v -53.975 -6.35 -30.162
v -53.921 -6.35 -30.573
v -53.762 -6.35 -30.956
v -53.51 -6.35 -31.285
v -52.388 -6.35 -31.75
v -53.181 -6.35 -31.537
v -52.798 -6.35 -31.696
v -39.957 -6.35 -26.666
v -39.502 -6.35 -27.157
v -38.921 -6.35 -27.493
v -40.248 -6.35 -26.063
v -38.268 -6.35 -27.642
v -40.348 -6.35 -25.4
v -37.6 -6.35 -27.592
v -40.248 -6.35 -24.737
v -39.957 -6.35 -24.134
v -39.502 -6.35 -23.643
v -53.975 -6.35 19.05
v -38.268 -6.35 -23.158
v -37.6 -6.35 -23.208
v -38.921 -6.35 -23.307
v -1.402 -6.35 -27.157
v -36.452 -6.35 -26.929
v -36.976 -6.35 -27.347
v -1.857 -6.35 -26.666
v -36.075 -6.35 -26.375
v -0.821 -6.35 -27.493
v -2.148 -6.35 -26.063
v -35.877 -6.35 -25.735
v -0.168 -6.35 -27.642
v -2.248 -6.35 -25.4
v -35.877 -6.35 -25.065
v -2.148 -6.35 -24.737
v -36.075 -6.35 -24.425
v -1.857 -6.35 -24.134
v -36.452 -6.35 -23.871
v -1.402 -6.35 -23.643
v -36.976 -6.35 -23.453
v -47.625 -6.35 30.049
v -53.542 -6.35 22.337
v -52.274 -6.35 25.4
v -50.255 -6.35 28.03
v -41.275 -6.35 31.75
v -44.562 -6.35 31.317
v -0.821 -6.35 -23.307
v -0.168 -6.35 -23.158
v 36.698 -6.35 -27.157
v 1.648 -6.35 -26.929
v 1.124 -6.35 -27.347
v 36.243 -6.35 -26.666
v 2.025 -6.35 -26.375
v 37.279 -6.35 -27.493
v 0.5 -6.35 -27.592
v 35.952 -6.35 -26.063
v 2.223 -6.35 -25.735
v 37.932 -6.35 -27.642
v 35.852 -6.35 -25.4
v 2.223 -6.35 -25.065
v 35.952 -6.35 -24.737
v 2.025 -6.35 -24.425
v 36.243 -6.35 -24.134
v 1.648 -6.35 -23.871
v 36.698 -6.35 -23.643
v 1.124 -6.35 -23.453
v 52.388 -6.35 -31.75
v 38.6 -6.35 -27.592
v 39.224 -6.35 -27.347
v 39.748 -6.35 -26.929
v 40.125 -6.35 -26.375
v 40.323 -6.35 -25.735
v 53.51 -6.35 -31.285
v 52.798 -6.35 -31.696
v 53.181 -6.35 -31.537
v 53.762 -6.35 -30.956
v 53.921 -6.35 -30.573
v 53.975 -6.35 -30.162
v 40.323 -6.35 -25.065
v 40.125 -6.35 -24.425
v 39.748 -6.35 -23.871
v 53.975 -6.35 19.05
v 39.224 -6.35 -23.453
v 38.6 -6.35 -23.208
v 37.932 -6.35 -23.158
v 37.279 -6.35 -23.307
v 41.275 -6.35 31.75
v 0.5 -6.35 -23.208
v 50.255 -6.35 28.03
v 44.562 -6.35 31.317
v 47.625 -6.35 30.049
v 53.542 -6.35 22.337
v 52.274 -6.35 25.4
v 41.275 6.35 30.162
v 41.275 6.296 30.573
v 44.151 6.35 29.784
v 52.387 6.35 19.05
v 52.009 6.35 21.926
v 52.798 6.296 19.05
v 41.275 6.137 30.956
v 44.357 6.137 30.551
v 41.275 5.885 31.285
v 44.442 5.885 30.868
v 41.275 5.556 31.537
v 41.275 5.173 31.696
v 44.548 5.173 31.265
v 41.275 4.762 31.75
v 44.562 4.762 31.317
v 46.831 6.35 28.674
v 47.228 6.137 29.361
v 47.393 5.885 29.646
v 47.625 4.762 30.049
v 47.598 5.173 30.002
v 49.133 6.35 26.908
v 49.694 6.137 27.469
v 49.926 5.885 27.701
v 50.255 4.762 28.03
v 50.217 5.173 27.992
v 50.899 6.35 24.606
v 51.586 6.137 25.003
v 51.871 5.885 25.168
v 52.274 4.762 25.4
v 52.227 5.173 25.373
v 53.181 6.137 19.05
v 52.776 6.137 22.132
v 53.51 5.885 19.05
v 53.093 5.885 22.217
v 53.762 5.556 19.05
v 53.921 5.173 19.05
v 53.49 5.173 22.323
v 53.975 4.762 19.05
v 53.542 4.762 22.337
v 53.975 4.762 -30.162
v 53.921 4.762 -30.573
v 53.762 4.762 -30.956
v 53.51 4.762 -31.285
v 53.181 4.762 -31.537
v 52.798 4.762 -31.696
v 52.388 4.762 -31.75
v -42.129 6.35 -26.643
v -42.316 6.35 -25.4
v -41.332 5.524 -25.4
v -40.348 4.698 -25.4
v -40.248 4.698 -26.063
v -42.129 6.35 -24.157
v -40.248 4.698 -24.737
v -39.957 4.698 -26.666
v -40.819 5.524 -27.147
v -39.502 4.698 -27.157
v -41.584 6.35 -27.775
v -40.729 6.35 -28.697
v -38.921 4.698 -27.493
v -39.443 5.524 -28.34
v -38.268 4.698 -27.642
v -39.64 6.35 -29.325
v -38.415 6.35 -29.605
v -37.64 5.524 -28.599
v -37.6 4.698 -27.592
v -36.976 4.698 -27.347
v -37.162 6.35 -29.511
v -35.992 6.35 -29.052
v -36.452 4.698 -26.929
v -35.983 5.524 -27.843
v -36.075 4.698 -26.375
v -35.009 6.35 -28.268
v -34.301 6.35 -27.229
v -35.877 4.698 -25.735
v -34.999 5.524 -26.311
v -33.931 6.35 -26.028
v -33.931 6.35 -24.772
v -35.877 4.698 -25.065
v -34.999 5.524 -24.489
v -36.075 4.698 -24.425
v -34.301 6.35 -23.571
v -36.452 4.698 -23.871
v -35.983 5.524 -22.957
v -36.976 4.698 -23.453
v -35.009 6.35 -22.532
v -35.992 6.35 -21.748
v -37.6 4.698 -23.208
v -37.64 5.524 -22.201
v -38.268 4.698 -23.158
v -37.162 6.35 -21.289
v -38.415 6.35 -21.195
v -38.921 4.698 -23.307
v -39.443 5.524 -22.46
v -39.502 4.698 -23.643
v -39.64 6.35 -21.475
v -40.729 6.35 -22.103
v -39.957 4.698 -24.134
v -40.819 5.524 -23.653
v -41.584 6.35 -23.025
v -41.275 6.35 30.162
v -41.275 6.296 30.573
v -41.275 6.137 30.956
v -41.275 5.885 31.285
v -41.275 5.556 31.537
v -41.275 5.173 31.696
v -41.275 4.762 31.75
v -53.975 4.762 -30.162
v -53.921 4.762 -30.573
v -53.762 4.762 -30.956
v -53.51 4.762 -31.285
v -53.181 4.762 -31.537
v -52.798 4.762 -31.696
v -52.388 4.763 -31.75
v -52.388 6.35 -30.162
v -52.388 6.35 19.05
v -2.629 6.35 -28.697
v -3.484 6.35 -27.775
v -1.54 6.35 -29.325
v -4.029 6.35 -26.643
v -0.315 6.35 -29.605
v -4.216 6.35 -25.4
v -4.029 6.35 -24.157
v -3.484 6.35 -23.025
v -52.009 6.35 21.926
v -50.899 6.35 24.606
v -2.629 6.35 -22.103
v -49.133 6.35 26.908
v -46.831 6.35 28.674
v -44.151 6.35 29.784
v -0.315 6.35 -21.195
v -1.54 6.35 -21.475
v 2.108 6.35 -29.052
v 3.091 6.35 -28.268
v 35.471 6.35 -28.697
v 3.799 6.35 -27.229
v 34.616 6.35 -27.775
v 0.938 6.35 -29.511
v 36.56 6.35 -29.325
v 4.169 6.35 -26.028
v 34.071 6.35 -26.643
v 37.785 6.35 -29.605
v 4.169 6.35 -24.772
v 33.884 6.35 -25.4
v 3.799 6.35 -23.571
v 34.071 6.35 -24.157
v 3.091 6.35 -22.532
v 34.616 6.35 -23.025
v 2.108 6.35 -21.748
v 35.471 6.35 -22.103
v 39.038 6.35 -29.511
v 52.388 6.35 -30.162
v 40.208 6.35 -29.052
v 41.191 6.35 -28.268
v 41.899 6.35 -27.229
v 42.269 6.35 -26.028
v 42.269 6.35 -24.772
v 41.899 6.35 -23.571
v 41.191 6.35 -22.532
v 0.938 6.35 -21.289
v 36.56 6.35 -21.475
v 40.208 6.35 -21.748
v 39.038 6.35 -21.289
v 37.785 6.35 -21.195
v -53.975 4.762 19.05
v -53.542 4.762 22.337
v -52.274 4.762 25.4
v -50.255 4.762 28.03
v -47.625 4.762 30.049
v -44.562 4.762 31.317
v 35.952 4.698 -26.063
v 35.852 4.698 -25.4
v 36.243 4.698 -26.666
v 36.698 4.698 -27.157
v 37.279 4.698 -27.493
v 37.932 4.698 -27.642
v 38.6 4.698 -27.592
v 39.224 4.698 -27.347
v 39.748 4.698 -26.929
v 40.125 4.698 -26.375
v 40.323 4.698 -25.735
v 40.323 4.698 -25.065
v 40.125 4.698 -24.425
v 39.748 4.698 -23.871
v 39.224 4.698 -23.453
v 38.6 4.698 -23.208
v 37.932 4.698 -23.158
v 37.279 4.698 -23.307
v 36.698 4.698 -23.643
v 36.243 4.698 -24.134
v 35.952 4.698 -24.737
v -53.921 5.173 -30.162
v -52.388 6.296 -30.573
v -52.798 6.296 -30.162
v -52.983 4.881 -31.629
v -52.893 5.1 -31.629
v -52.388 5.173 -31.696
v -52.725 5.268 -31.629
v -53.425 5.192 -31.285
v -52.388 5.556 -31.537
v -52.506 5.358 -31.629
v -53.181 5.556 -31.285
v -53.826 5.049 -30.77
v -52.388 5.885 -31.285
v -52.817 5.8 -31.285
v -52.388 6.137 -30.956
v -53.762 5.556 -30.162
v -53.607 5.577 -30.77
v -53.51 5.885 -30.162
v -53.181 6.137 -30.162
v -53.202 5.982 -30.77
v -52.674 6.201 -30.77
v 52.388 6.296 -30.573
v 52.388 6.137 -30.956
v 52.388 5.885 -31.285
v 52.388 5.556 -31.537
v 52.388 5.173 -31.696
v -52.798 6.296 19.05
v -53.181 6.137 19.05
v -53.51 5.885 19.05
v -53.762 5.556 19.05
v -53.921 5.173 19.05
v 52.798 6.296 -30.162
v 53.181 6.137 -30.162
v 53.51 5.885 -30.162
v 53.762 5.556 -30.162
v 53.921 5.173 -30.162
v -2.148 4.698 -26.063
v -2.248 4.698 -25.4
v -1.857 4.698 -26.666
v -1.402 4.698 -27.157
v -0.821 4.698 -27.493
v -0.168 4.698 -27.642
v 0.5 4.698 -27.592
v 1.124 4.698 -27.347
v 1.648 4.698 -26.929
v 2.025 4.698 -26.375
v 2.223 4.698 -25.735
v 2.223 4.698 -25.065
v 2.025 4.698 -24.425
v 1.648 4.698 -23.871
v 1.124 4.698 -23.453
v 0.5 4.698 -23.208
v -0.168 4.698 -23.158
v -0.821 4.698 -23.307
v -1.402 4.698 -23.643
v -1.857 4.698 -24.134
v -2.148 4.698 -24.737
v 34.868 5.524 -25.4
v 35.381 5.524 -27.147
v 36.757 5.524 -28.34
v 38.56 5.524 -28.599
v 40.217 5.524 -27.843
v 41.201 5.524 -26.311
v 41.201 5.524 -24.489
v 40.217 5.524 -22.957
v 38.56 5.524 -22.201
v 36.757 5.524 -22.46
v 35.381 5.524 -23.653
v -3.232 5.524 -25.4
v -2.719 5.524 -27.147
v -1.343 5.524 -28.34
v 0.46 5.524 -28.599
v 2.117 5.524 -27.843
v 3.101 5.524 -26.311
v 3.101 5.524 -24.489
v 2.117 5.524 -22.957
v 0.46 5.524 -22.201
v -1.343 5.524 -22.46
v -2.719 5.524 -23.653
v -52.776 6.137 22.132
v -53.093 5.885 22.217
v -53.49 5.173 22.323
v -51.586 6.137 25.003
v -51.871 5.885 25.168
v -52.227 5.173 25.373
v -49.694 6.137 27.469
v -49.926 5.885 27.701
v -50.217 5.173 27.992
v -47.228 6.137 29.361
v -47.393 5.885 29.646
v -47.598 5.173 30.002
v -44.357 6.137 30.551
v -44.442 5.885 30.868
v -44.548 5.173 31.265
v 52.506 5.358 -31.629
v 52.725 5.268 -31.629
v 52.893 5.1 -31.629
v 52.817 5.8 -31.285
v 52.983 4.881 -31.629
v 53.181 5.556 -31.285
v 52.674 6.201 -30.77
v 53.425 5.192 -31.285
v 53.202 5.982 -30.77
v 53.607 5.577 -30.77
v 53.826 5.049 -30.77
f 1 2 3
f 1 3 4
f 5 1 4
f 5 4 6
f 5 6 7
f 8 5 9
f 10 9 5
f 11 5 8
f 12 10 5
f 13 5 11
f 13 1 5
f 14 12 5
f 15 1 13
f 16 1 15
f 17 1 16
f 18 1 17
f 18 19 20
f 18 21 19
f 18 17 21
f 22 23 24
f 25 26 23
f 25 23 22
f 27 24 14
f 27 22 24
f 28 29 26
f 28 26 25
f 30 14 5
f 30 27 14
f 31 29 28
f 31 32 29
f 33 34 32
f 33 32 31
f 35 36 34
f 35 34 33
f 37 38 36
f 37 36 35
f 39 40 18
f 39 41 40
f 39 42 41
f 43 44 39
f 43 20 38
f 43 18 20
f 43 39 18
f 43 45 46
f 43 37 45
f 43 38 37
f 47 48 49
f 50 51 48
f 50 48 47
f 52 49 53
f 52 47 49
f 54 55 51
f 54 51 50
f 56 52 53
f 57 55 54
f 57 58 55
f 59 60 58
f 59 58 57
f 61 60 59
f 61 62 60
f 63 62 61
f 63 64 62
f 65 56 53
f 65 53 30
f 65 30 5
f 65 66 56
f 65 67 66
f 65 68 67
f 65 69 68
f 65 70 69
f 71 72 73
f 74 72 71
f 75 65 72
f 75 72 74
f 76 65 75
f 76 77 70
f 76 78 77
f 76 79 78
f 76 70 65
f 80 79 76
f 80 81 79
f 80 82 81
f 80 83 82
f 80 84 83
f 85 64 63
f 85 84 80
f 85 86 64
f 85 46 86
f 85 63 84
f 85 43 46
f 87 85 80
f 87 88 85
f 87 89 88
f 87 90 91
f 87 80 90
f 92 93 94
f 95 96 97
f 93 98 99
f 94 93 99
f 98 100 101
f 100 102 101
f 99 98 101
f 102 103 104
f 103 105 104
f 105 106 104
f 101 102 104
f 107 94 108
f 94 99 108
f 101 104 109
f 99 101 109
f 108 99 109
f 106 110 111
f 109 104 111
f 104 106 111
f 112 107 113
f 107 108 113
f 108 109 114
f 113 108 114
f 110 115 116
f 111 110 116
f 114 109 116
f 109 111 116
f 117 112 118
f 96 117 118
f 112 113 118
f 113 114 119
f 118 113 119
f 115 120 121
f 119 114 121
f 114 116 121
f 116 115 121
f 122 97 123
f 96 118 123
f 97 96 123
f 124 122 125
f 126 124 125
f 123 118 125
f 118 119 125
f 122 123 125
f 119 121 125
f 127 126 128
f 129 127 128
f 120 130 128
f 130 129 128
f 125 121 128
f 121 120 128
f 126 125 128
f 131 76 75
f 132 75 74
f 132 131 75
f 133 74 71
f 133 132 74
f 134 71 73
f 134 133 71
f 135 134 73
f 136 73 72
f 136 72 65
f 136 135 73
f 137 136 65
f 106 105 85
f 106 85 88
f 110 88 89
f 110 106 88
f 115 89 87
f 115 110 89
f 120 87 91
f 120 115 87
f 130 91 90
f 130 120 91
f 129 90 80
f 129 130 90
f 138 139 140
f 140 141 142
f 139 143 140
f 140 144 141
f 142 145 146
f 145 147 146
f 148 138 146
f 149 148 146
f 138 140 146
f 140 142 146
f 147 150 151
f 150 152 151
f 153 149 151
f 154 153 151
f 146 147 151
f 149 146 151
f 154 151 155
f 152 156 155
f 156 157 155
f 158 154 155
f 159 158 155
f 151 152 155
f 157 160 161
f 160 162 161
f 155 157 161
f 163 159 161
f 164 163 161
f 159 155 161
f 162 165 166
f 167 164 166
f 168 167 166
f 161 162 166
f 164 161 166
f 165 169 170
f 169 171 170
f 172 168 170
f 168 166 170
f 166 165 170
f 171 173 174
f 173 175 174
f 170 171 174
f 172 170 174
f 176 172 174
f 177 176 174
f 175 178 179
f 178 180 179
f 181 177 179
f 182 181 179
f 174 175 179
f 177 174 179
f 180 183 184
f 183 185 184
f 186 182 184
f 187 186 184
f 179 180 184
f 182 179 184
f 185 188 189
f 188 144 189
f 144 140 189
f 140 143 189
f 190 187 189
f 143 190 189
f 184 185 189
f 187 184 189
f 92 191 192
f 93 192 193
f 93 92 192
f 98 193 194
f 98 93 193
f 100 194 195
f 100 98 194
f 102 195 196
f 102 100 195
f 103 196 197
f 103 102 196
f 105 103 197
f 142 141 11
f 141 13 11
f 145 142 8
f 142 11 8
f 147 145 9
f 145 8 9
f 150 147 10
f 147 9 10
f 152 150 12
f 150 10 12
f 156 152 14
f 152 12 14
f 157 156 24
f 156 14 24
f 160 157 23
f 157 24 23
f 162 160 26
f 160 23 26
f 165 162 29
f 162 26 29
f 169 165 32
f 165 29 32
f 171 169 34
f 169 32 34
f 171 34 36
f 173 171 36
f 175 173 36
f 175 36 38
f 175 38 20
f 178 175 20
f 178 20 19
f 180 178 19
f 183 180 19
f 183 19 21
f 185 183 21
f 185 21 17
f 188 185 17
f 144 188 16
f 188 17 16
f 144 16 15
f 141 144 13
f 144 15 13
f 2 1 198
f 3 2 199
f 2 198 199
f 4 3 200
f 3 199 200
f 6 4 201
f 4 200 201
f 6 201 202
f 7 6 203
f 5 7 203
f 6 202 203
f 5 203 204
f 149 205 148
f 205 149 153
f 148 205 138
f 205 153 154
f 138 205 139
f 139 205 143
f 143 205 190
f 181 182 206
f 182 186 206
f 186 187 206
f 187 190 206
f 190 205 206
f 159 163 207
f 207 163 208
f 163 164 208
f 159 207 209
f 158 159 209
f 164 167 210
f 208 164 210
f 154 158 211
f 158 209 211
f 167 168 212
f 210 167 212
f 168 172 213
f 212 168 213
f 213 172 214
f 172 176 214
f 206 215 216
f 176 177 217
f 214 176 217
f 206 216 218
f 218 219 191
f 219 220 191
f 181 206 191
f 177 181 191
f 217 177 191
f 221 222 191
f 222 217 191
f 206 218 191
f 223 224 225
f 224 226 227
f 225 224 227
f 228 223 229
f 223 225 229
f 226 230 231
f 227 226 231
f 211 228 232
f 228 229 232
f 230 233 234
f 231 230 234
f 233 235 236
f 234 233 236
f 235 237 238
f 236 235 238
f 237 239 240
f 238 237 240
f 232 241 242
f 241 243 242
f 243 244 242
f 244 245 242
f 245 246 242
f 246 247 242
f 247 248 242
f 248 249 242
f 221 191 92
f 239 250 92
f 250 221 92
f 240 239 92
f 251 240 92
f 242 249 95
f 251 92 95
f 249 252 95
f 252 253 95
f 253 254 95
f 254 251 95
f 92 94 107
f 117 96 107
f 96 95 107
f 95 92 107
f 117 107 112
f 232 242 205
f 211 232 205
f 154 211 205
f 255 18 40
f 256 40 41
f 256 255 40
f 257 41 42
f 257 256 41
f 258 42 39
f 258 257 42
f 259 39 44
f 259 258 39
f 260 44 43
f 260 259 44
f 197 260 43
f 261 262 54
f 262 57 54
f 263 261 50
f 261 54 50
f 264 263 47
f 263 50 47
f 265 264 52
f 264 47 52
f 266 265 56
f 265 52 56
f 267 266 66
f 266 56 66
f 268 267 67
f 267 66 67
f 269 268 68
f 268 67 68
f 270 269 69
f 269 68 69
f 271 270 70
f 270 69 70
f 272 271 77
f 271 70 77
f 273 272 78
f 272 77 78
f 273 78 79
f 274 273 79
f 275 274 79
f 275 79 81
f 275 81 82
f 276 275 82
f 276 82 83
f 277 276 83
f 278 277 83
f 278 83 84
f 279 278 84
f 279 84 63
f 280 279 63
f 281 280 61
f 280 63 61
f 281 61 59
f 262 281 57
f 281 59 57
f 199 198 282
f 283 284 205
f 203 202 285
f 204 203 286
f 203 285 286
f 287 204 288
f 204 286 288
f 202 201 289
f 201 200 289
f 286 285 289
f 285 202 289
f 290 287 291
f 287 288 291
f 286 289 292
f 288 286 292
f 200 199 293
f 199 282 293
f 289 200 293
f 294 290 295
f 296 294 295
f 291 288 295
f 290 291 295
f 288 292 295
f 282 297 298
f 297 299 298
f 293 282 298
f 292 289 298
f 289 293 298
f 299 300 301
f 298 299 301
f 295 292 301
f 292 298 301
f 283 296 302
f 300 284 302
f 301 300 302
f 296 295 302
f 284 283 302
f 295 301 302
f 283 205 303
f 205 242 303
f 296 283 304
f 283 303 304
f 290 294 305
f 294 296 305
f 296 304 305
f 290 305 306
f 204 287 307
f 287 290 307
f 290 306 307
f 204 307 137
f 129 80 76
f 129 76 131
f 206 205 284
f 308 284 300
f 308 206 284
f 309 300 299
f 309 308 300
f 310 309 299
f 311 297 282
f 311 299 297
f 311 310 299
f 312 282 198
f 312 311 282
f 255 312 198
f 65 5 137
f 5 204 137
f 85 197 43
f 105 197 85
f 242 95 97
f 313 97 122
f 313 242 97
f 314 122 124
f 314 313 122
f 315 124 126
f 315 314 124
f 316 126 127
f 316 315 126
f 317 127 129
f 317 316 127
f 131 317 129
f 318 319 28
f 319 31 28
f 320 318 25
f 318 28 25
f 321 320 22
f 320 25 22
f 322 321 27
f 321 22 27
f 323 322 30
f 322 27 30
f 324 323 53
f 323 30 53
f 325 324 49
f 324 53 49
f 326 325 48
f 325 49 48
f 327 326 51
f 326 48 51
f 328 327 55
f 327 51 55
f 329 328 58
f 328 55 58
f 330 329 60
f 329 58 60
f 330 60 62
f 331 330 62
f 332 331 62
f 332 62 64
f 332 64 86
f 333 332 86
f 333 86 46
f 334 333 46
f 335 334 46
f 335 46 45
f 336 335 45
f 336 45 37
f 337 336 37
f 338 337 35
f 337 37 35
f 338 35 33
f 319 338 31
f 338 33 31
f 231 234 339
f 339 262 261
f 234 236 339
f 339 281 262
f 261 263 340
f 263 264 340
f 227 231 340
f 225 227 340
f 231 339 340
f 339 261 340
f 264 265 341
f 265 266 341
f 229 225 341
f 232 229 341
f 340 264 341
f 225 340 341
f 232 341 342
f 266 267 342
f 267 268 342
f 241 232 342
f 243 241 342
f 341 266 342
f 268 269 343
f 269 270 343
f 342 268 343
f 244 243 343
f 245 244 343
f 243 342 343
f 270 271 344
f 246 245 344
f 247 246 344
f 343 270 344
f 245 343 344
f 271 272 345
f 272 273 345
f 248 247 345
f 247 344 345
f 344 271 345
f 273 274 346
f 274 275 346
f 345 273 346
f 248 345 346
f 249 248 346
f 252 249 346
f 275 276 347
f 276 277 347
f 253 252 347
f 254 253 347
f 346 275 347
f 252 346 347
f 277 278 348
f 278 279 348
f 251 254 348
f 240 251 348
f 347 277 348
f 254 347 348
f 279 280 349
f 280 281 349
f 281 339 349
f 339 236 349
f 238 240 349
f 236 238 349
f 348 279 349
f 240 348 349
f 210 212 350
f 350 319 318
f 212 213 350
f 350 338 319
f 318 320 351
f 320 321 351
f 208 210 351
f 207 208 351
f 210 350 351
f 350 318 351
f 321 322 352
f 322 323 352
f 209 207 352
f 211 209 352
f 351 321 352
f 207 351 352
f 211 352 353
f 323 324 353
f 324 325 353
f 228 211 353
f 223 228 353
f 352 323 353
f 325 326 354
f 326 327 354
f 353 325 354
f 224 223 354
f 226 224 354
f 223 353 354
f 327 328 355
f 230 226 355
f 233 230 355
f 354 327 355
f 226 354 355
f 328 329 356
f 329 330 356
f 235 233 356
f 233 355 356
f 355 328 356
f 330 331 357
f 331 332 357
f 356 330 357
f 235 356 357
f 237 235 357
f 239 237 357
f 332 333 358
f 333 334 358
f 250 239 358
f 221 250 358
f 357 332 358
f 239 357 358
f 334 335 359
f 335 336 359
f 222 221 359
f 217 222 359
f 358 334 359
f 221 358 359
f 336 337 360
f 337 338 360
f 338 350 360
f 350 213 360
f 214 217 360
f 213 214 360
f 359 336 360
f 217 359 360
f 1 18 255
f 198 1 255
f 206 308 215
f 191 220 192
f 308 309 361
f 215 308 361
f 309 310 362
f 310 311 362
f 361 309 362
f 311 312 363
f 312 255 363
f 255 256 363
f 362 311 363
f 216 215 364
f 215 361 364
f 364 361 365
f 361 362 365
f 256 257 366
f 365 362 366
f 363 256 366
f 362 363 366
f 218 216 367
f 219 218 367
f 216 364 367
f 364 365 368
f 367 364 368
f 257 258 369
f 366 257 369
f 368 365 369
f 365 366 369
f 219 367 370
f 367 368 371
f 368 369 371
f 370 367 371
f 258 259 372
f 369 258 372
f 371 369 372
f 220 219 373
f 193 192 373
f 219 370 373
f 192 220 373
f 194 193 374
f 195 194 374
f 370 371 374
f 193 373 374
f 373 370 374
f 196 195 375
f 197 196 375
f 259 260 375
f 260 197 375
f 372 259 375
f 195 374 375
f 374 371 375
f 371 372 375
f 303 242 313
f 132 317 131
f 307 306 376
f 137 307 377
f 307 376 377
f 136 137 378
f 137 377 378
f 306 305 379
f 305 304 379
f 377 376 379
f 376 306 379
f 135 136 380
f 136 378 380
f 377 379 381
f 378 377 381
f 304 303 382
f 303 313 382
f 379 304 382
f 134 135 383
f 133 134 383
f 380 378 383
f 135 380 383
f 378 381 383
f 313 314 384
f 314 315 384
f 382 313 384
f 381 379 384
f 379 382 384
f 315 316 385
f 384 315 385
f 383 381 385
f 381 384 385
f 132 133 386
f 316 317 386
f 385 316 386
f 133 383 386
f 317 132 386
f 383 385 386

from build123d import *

# Parameters (mm, degrees)
SKETCH1_W                                         = 107.95
SKETCH1_H                                         = 12.7
BOSS_EXTRUDE1_DEPTH                               = 31.75
FILLET1_R                                         = 12.7
CSK_FOR_8_FLAT_HEAD_MACHINE_SCREW_100_D           = 4.4958
CSK_FOR_8_FLAT_HEAD_MACHINE_SCREW_100_DEPTH       = 19.05
CSK_FOR_8_FLAT_HEAD_MACHINE_SCREW_100_CSINK_D     = 8.4328
CSK_FOR_8_FLAT_HEAD_MACHINE_SCREW_100_CSINK_ANGLE = 100
CSK_FOR_8_FLAT_HEAD_MACHINE_SCREW_100_TIP         = 1.350674586
FILLET2_R                                         = 1.5875


with BuildPart() as part:
    # Sketch1 → Boss-Extrude1 (new, symmetric)
    with BuildSketch(Plane.XY):
        Rectangle(SKETCH1_W, SKETCH1_H)
    extrude(amount=BOSS_EXTRUDE1_DEPTH, both=True)

    # Fillet1
    fillet1_edges = [part.edges().sort_by_distance(p)[0] for p in [
        (-53.975, 0, 31.75),
        (53.975, 0, 31.75),
    ]]
    fillet(fillet1_edges, radius=FILLET1_R)

    # CSK for #8 Flat Head Machine Screw (100)1
    with Locations(Plane(origin=(0, 6.35, 0), x_dir=(1, 0, 0), z_dir=(0, 1, 0))):
        with Locations((-38.1, 25.4), (38.1, 25.4), (0, 25.4)):
            CounterSinkHole(CSK_FOR_8_FLAT_HEAD_MACHINE_SCREW_100_D / 2, CSK_FOR_8_FLAT_HEAD_MACHINE_SCREW_100_CSINK_D / 2, depth=CSK_FOR_8_FLAT_HEAD_MACHINE_SCREW_100_DEPTH, counter_sink_angle=CSK_FOR_8_FLAT_HEAD_MACHINE_SCREW_100_CSINK_ANGLE)
            with Locations((0, 0, -(CSK_FOR_8_FLAT_HEAD_MACHINE_SCREW_100_DEPTH + CSK_FOR_8_FLAT_HEAD_MACHINE_SCREW_100_TIP / 2))):  # 118° drill point
                Cone(0, CSK_FOR_8_FLAT_HEAD_MACHINE_SCREW_100_D / 2, CSK_FOR_8_FLAT_HEAD_MACHINE_SCREW_100_TIP, mode=Mode.SUBTRACT)

    # Fillet2
    fillet2_edges = [part.edges().sort_by_distance(p)[0] for p in [
        (0, 6.35, 31.75),
        (-53.975, 6.35, -6.35),
        (53.975, 6.35, -6.35),
        (50.255256121, 6.35, 28.030256121),
        (-50.255256121, 6.35, 28.030256121),
        (-53.975, 0, -31.75),
        (0, 6.35, -31.75),
        (53.975, 0, -31.75),
    ]]
    fillet(fillet2_edges, radius=FILLET2_R)


solid = part.part
